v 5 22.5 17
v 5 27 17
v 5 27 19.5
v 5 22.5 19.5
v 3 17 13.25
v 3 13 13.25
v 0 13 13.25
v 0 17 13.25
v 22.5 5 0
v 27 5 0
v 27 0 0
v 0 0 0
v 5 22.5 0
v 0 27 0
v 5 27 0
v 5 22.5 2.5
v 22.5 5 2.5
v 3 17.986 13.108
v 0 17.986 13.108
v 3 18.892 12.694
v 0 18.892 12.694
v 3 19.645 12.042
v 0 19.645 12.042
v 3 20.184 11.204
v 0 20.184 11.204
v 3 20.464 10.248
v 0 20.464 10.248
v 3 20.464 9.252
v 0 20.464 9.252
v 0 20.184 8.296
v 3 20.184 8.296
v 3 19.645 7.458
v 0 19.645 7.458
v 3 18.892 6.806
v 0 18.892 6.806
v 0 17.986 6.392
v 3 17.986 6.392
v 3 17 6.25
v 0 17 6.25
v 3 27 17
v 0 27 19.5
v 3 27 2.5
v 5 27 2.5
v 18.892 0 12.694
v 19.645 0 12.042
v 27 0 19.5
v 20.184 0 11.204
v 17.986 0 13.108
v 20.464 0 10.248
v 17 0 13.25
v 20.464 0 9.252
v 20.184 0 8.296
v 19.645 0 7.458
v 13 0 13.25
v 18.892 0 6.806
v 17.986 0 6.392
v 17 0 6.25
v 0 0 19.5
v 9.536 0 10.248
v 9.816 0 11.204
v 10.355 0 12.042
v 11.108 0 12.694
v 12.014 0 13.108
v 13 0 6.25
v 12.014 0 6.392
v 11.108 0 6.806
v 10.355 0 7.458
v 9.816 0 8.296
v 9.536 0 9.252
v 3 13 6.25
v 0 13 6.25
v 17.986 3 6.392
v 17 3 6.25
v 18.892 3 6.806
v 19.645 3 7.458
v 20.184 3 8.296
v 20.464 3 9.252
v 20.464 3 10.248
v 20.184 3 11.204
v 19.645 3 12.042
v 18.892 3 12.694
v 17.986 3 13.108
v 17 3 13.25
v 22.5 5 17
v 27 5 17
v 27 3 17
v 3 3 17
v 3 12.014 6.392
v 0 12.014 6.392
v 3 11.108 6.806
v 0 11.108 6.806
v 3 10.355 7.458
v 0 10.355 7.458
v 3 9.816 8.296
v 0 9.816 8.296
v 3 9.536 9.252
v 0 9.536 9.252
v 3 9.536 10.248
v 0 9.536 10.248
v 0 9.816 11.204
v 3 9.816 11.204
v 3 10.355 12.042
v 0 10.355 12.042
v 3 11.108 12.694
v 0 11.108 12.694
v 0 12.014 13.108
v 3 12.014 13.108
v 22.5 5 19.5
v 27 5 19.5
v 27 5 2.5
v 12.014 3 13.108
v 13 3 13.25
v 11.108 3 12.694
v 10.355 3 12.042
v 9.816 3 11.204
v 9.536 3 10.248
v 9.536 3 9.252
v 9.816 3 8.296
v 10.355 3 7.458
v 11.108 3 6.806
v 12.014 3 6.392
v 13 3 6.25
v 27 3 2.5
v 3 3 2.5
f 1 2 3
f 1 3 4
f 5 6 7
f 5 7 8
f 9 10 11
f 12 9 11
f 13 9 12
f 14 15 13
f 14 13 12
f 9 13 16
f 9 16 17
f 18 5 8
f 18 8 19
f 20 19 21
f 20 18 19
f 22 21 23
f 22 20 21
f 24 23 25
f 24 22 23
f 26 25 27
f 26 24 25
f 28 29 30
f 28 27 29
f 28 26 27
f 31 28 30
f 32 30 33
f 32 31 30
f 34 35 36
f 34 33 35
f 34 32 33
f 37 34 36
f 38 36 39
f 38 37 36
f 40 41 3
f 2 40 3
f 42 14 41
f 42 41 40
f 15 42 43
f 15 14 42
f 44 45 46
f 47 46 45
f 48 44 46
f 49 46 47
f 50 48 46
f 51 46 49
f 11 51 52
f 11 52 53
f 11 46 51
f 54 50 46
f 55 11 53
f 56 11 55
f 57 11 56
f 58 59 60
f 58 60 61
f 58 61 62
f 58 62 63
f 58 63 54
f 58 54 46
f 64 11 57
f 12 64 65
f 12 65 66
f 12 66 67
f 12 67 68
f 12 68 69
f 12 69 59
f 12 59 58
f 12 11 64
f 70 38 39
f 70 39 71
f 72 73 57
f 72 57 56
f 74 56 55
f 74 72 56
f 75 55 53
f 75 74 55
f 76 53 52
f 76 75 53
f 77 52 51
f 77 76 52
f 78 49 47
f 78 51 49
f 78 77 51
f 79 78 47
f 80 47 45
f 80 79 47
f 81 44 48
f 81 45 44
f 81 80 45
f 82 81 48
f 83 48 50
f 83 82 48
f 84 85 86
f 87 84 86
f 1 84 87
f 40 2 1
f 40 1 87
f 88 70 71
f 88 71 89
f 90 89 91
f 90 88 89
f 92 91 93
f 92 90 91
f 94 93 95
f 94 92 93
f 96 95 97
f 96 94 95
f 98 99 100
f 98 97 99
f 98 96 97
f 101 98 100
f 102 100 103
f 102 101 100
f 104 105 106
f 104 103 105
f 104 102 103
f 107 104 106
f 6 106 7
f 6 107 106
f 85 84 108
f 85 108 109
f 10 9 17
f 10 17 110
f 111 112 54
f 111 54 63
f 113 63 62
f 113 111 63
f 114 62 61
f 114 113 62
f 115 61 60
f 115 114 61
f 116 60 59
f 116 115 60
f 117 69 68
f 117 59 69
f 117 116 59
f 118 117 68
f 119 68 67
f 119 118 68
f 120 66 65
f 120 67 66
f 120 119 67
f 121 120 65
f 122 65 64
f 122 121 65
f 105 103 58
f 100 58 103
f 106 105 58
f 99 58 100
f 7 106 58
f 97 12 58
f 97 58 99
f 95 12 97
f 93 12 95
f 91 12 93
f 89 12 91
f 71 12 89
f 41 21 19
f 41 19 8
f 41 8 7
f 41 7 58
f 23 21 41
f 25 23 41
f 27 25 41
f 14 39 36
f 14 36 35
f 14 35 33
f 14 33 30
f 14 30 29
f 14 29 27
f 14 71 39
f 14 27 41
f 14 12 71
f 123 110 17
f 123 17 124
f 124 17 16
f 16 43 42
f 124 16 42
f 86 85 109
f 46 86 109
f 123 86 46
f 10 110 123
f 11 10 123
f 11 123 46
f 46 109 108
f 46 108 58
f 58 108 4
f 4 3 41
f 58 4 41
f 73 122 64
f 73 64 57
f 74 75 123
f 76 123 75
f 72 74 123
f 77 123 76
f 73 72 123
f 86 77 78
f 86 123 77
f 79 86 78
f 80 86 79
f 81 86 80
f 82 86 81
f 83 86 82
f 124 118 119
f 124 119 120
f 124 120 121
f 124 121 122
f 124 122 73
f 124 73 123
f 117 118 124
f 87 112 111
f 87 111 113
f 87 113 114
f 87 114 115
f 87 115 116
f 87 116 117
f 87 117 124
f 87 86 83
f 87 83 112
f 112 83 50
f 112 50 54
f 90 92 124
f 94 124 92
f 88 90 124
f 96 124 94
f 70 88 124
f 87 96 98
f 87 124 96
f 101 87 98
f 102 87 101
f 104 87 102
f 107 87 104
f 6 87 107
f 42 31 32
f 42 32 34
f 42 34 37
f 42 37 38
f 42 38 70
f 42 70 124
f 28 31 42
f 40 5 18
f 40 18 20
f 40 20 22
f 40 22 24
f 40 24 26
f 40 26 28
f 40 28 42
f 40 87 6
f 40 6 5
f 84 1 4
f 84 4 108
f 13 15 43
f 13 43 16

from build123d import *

# Parameters (mm, degrees)
BOSS_EXTRUDE1_DEPTH = 19.5
CUT_EXTRUDE2_DEPTH  = 14.5
CUT_EXTRUDE3_DEPTH  = 42.05179655
CUT_EXTRUDE4_DEPTH  = 42.05179655


with BuildPart() as part:
    # Sketch1 → Boss-Extrude1 (new body)
    with BuildSketch(Plane.XY):
        Polygon((0, 0), (0, 27), (5, 27), (5, 22.5), (22.5, 5), (27, 5), (27, 0), align=None)
    extrude(amount=BOSS_EXTRUDE1_DEPTH)

    # Sketch2 → Cut-Extrude2 (cut)
    with BuildSketch(Plane.XY.offset(17)):
        Polygon((3, 27), (5, 27), (5, 22.5), (22.5, 5), (27, 5), (27, 3), (3, 3), align=None)
    extrude(amount=-CUT_EXTRUDE2_DEPTH, mode=Mode.SUBTRACT)

    # Sketch3 → Cut-Extrude3 (cut, through all)
    with BuildSketch(Plane(origin=(0, 3, 0), x_dir=(1, 0, 0), z_dir=(0, 1, 0))):
        with BuildLine():
            Line((13, -6.25), (17, -6.25))
            ThreePointArc((17, -6.25), (20.5, -9.75), (17, -13.25))
            Line((17, -13.25), (13, -13.25))
            ThreePointArc((13, -13.25), (9.5, -9.75), (13, -6.25))
        make_face()
    extrude(amount=-CUT_EXTRUDE3_DEPTH, mode=Mode.SUBTRACT)

    # Sketch4 → Cut-Extrude4 (cut, through all)
    with BuildSketch(Plane(origin=(3, 0, 0), x_dir=(0, 0, -1), z_dir=(1, 0, 0))):
        with BuildLine():
            Line((-13.25, 13), (-13.25, 17))
            ThreePointArc((-13.25, 17), (-9.75, 20.5), (-6.25, 17))
            Line((-6.25, 17), (-6.25, 13))
            ThreePointArc((-6.25, 13), (-9.75, 9.5), (-13.25, 13))
        make_face()
    extrude(amount=-CUT_EXTRUDE4_DEPTH, mode=Mode.SUBTRACT)


solid = part.part
